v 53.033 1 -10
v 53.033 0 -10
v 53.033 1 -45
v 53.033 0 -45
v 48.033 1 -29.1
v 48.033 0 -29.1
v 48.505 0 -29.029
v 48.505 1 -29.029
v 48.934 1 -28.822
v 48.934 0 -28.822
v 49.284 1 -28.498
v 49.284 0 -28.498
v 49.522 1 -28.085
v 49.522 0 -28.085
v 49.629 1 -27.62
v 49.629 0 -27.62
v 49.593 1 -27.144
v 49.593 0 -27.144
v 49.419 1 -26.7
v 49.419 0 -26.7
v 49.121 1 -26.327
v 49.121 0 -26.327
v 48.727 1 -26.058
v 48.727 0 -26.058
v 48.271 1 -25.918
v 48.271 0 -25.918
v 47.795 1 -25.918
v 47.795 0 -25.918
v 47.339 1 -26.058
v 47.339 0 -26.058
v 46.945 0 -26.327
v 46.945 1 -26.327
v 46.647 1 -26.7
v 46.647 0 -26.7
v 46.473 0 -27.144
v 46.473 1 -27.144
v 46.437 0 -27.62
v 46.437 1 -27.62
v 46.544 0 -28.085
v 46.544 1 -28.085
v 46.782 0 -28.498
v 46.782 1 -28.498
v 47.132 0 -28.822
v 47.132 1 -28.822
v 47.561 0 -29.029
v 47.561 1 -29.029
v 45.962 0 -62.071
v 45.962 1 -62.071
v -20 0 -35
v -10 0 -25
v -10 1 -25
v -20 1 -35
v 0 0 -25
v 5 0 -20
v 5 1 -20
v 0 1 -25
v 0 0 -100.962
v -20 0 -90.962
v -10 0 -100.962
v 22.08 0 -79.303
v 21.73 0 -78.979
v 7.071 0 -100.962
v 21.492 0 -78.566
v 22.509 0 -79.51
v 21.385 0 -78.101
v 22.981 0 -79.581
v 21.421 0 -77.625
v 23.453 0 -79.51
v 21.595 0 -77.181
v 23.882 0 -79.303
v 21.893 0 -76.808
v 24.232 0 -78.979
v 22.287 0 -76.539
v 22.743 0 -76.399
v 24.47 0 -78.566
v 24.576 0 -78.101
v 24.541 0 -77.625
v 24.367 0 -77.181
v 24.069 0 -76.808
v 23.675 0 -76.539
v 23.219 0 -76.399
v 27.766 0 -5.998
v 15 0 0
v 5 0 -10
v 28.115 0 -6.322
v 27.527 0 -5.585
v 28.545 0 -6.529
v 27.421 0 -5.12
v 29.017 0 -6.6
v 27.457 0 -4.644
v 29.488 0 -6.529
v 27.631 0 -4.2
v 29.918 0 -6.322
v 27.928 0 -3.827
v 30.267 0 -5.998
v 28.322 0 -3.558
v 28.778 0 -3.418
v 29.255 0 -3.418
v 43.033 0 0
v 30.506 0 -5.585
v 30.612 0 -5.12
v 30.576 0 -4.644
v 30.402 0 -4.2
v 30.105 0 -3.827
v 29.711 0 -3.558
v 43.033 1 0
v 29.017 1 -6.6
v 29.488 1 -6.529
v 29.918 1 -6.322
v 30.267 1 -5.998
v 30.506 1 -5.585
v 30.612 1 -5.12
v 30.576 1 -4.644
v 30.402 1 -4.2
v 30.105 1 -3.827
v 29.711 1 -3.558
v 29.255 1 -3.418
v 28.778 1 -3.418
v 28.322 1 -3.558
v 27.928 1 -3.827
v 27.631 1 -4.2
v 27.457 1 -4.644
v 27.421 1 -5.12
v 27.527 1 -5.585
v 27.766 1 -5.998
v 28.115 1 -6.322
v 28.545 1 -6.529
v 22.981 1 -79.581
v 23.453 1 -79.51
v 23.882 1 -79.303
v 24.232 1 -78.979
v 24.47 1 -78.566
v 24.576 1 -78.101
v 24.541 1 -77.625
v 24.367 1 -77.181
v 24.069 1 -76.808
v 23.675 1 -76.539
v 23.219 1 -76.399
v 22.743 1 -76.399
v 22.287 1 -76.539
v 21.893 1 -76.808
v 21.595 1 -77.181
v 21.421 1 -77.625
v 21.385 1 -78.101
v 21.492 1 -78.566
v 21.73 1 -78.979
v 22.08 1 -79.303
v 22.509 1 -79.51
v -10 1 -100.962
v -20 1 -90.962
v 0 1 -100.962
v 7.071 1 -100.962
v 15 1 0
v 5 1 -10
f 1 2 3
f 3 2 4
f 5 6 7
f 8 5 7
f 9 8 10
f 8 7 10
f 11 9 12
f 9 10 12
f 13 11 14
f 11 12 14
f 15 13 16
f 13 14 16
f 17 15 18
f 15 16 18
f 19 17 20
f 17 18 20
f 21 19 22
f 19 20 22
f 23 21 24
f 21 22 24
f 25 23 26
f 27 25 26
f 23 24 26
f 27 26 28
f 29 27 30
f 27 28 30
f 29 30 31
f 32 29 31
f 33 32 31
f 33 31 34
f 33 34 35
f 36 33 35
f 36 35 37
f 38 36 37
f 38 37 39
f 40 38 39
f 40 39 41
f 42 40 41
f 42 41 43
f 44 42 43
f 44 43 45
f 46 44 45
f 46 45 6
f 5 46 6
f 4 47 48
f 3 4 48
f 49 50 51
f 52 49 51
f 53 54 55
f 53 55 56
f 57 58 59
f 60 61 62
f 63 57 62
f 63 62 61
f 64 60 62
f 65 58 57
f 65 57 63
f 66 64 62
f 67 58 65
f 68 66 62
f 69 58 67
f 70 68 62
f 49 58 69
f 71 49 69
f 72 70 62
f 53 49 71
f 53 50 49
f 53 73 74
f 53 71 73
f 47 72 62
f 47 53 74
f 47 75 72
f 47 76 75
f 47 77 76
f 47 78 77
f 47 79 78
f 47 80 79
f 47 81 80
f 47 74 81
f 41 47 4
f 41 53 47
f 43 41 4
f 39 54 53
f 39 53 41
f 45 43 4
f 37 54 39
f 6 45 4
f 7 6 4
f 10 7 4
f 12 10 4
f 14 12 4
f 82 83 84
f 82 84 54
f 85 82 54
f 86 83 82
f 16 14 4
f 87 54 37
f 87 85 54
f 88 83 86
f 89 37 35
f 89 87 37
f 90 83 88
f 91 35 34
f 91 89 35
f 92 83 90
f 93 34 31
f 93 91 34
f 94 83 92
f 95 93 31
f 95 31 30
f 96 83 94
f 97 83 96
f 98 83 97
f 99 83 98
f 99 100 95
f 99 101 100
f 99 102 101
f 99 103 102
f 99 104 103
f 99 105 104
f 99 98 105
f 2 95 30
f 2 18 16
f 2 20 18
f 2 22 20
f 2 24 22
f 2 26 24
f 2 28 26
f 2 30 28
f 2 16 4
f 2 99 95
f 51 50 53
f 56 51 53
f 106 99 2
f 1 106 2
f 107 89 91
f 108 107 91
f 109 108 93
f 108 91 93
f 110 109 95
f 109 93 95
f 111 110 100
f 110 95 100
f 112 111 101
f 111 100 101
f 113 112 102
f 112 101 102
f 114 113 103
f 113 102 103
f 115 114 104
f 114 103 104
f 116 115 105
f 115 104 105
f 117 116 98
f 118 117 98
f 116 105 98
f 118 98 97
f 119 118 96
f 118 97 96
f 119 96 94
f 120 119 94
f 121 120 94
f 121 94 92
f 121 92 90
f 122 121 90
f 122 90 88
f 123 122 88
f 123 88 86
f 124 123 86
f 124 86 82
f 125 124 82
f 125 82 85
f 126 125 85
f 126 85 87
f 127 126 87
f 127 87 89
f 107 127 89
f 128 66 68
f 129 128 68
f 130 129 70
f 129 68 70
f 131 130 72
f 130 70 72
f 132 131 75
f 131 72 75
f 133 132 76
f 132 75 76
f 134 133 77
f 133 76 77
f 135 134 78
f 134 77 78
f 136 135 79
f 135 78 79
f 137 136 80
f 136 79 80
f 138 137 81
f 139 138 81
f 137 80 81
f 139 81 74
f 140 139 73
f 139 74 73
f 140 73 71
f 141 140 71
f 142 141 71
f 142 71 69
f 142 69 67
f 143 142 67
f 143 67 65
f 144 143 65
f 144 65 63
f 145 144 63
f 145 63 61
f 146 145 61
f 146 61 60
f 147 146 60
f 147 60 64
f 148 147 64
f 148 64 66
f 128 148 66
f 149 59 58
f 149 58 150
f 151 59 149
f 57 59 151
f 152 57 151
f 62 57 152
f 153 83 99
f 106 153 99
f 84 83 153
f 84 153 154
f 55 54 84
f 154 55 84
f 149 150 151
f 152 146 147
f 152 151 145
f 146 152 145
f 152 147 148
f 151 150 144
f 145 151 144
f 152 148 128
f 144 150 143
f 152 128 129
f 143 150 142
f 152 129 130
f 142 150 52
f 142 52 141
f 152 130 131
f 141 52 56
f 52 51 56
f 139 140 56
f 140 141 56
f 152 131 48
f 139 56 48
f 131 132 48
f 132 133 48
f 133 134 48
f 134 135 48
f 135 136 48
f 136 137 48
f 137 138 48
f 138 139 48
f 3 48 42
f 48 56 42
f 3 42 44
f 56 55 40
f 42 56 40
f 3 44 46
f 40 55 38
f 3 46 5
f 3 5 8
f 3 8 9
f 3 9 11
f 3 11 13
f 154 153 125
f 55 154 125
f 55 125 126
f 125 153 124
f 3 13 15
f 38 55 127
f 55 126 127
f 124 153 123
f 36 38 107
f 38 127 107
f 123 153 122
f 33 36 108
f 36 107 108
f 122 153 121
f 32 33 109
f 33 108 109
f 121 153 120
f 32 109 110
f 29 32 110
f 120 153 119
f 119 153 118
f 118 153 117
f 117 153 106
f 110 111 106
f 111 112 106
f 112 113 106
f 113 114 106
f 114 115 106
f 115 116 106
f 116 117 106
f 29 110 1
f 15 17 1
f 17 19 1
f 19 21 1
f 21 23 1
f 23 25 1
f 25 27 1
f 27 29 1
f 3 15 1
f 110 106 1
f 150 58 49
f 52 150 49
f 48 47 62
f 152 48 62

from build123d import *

# Parameters (mm, degrees)
EXTRUDE_1_DEPTH     = 1
SKETCH_2_W          = 5
SKETCH_2_H          = 30
CUT_EXTRUDE_1_DEPTH = 10
CHAMFER_1_SIZE      = 10
CHAMFER_1_SIZE_2    = 7.071067812
CHAMFER_2_SIZE      = 10
SKETCH_3_R          = 1.6
CUT_EXTRUDE_2_DEPTH = 10
SKETCH_4_W          = 20
SKETCH_4_H          = 75.961940777
EXTRUDE_2_DEPTH     = 1
CHAMFER_3_SIZE      = 10


with BuildPart() as part:
    # 草图1 → 凸台-拉伸1 (new body)
    with BuildSketch(Plane(origin=(0, 0, 0), x_dir=(1, 0, 0), z_dir=(0, 1, 0))):
        Polygon((0, 0), (53.033008589, 0), (53.033008589, 55), (0, 108.033008589), align=None)
    extrude(amount=EXTRUDE_1_DEPTH)

    # 草图2 → 切除-拉伸1 (cut)
    with BuildSketch(Plane.XZ):
        with Locations((2.5, -15)):
            Rectangle(SKETCH_2_W, SKETCH_2_H)
    extrude(amount=-CUT_EXTRUDE_1_DEPTH, mode=Mode.SUBTRACT)

    # 倒角1
    # the kernel refuses this chamfer: 10, 7.071067812 mm, written as the material it adds along each edge
    with BuildSketch(Plane(origin=(5, 0, -30), x_dir=(0.027495876610586403, 0, 0.9996219169112968), z_dir=(0, 1, 0))) as chamfer_1_piece_1_section:
        Polygon((CHAMFER_1_SIZE * 0.999621916911, -CHAMFER_1_SIZE * 0.0274958766106), (-CHAMFER_1_SIZE * 0.0274958766106, -CHAMFER_1_SIZE * 0.999621916911), (0, 0), align=None)
    chamfer_1_piece_1 = extrude(amount=1, mode=Mode.PRIVATE)
    chamfer_1_piece_1 = split(chamfer_1_piece_1, bisect_by=Plane(origin=(0, 0.5, -26.065989159), z_dir=(1, 0, 0)), keep=Keep.TOP, mode=Mode.PRIVATE)
    add(chamfer_1_piece_1)
    # the kernel refuses this chamfer: 10, 7.071067812 mm, written as the material it takes off along each edge
    with BuildSketch(Plane(origin=(0, -25.71682988, -108.033008589), x_dir=(-0.056478249472490825, 0, 0.9984038297885897), z_dir=(0, 1, 0))) as chamfer_1_2_piece_1:
        Polygon((CHAMFER_1_SIZE_2 * 0.99840382977, CHAMFER_1_SIZE_2 * 0.0564782494714), (CHAMFER_1_SIZE * 0.666041965215, CHAMFER_1_SIZE * 0.745914271598), (0, 0), align=None)
    extrude(amount=52.433659759, mode=Mode.SUBTRACT)
    with BuildSketch(Plane(origin=(5, -25.71682988, 0), x_dir=(0.9996219169112968, 0, 0.027495876610586372), z_dir=(0, 1, 0))) as chamfer_1_2_piece_2:
        Polygon((CHAMFER_1_SIZE * 0.999621916911, CHAMFER_1_SIZE * 0.0274958766106), (-CHAMFER_1_SIZE * 0.0274958766106, CHAMFER_1_SIZE * 0.999621916911), (0, 0), align=None)
    extrude(amount=52.433659759, mode=Mode.SUBTRACT)
    with BuildSketch(Plane(origin=(53.033008589, -25.71682988, 0), x_dir=(-0.9996219169112968, 0, 0.027495876610586372), z_dir=(0, 1, 0))) as chamfer_1_2_piece_3:
        Polygon((CHAMFER_1_SIZE * 0.999621916911, -CHAMFER_1_SIZE * 0.0274958766106), (-CHAMFER_1_SIZE * 0.0274958766106, -CHAMFER_1_SIZE * 0.999621916911), (0, 0), align=None)
    extrude(amount=52.433659759, mode=Mode.SUBTRACT)

    # 倒角2
    chamfer_2_edges = [part.edges().sort_by_distance(p)[0] for p in [
        (53.033008589, 0.5, -55),
    ]]
    chamfer(chamfer_2_edges, length=CHAMFER_2_SIZE)

    # 草图3 → 切除-拉伸2 (cut)
    with BuildSketch(Plane.XZ):
        with Locations(Location((22.980970389, -77.980970389, 0), (0, 0, 270))):
            Circle(SKETCH_3_R)
        with Locations(Location((48.033008589, -27.5, 0), (0, 0, 270))):
            Circle(SKETCH_3_R)
        with Locations(Location((29.016504294, -5, 0), (0, 0, 270))):
            Circle(SKETCH_3_R)
    extrude(amount=-CUT_EXTRUDE_2_DEPTH, mode=Mode.SUBTRACT)

    # 草图4 → 凸台-拉伸2 (add)
    with BuildSketch(Plane.XZ):
        with Locations((-10, -62.980970389)):
            Rectangle(SKETCH_4_W, SKETCH_4_H)
    extrude(amount=-EXTRUDE_2_DEPTH)

    # 倒角3
    chamfer_3_edges = [part.edges().sort_by_distance(p)[0] for p in [
        (-20, 0.5, -25),
        (-20, 0.5, -100.961940777),
    ]]
    chamfer(chamfer_3_edges, length=CHAMFER_3_SIZE)


solid = part.part
